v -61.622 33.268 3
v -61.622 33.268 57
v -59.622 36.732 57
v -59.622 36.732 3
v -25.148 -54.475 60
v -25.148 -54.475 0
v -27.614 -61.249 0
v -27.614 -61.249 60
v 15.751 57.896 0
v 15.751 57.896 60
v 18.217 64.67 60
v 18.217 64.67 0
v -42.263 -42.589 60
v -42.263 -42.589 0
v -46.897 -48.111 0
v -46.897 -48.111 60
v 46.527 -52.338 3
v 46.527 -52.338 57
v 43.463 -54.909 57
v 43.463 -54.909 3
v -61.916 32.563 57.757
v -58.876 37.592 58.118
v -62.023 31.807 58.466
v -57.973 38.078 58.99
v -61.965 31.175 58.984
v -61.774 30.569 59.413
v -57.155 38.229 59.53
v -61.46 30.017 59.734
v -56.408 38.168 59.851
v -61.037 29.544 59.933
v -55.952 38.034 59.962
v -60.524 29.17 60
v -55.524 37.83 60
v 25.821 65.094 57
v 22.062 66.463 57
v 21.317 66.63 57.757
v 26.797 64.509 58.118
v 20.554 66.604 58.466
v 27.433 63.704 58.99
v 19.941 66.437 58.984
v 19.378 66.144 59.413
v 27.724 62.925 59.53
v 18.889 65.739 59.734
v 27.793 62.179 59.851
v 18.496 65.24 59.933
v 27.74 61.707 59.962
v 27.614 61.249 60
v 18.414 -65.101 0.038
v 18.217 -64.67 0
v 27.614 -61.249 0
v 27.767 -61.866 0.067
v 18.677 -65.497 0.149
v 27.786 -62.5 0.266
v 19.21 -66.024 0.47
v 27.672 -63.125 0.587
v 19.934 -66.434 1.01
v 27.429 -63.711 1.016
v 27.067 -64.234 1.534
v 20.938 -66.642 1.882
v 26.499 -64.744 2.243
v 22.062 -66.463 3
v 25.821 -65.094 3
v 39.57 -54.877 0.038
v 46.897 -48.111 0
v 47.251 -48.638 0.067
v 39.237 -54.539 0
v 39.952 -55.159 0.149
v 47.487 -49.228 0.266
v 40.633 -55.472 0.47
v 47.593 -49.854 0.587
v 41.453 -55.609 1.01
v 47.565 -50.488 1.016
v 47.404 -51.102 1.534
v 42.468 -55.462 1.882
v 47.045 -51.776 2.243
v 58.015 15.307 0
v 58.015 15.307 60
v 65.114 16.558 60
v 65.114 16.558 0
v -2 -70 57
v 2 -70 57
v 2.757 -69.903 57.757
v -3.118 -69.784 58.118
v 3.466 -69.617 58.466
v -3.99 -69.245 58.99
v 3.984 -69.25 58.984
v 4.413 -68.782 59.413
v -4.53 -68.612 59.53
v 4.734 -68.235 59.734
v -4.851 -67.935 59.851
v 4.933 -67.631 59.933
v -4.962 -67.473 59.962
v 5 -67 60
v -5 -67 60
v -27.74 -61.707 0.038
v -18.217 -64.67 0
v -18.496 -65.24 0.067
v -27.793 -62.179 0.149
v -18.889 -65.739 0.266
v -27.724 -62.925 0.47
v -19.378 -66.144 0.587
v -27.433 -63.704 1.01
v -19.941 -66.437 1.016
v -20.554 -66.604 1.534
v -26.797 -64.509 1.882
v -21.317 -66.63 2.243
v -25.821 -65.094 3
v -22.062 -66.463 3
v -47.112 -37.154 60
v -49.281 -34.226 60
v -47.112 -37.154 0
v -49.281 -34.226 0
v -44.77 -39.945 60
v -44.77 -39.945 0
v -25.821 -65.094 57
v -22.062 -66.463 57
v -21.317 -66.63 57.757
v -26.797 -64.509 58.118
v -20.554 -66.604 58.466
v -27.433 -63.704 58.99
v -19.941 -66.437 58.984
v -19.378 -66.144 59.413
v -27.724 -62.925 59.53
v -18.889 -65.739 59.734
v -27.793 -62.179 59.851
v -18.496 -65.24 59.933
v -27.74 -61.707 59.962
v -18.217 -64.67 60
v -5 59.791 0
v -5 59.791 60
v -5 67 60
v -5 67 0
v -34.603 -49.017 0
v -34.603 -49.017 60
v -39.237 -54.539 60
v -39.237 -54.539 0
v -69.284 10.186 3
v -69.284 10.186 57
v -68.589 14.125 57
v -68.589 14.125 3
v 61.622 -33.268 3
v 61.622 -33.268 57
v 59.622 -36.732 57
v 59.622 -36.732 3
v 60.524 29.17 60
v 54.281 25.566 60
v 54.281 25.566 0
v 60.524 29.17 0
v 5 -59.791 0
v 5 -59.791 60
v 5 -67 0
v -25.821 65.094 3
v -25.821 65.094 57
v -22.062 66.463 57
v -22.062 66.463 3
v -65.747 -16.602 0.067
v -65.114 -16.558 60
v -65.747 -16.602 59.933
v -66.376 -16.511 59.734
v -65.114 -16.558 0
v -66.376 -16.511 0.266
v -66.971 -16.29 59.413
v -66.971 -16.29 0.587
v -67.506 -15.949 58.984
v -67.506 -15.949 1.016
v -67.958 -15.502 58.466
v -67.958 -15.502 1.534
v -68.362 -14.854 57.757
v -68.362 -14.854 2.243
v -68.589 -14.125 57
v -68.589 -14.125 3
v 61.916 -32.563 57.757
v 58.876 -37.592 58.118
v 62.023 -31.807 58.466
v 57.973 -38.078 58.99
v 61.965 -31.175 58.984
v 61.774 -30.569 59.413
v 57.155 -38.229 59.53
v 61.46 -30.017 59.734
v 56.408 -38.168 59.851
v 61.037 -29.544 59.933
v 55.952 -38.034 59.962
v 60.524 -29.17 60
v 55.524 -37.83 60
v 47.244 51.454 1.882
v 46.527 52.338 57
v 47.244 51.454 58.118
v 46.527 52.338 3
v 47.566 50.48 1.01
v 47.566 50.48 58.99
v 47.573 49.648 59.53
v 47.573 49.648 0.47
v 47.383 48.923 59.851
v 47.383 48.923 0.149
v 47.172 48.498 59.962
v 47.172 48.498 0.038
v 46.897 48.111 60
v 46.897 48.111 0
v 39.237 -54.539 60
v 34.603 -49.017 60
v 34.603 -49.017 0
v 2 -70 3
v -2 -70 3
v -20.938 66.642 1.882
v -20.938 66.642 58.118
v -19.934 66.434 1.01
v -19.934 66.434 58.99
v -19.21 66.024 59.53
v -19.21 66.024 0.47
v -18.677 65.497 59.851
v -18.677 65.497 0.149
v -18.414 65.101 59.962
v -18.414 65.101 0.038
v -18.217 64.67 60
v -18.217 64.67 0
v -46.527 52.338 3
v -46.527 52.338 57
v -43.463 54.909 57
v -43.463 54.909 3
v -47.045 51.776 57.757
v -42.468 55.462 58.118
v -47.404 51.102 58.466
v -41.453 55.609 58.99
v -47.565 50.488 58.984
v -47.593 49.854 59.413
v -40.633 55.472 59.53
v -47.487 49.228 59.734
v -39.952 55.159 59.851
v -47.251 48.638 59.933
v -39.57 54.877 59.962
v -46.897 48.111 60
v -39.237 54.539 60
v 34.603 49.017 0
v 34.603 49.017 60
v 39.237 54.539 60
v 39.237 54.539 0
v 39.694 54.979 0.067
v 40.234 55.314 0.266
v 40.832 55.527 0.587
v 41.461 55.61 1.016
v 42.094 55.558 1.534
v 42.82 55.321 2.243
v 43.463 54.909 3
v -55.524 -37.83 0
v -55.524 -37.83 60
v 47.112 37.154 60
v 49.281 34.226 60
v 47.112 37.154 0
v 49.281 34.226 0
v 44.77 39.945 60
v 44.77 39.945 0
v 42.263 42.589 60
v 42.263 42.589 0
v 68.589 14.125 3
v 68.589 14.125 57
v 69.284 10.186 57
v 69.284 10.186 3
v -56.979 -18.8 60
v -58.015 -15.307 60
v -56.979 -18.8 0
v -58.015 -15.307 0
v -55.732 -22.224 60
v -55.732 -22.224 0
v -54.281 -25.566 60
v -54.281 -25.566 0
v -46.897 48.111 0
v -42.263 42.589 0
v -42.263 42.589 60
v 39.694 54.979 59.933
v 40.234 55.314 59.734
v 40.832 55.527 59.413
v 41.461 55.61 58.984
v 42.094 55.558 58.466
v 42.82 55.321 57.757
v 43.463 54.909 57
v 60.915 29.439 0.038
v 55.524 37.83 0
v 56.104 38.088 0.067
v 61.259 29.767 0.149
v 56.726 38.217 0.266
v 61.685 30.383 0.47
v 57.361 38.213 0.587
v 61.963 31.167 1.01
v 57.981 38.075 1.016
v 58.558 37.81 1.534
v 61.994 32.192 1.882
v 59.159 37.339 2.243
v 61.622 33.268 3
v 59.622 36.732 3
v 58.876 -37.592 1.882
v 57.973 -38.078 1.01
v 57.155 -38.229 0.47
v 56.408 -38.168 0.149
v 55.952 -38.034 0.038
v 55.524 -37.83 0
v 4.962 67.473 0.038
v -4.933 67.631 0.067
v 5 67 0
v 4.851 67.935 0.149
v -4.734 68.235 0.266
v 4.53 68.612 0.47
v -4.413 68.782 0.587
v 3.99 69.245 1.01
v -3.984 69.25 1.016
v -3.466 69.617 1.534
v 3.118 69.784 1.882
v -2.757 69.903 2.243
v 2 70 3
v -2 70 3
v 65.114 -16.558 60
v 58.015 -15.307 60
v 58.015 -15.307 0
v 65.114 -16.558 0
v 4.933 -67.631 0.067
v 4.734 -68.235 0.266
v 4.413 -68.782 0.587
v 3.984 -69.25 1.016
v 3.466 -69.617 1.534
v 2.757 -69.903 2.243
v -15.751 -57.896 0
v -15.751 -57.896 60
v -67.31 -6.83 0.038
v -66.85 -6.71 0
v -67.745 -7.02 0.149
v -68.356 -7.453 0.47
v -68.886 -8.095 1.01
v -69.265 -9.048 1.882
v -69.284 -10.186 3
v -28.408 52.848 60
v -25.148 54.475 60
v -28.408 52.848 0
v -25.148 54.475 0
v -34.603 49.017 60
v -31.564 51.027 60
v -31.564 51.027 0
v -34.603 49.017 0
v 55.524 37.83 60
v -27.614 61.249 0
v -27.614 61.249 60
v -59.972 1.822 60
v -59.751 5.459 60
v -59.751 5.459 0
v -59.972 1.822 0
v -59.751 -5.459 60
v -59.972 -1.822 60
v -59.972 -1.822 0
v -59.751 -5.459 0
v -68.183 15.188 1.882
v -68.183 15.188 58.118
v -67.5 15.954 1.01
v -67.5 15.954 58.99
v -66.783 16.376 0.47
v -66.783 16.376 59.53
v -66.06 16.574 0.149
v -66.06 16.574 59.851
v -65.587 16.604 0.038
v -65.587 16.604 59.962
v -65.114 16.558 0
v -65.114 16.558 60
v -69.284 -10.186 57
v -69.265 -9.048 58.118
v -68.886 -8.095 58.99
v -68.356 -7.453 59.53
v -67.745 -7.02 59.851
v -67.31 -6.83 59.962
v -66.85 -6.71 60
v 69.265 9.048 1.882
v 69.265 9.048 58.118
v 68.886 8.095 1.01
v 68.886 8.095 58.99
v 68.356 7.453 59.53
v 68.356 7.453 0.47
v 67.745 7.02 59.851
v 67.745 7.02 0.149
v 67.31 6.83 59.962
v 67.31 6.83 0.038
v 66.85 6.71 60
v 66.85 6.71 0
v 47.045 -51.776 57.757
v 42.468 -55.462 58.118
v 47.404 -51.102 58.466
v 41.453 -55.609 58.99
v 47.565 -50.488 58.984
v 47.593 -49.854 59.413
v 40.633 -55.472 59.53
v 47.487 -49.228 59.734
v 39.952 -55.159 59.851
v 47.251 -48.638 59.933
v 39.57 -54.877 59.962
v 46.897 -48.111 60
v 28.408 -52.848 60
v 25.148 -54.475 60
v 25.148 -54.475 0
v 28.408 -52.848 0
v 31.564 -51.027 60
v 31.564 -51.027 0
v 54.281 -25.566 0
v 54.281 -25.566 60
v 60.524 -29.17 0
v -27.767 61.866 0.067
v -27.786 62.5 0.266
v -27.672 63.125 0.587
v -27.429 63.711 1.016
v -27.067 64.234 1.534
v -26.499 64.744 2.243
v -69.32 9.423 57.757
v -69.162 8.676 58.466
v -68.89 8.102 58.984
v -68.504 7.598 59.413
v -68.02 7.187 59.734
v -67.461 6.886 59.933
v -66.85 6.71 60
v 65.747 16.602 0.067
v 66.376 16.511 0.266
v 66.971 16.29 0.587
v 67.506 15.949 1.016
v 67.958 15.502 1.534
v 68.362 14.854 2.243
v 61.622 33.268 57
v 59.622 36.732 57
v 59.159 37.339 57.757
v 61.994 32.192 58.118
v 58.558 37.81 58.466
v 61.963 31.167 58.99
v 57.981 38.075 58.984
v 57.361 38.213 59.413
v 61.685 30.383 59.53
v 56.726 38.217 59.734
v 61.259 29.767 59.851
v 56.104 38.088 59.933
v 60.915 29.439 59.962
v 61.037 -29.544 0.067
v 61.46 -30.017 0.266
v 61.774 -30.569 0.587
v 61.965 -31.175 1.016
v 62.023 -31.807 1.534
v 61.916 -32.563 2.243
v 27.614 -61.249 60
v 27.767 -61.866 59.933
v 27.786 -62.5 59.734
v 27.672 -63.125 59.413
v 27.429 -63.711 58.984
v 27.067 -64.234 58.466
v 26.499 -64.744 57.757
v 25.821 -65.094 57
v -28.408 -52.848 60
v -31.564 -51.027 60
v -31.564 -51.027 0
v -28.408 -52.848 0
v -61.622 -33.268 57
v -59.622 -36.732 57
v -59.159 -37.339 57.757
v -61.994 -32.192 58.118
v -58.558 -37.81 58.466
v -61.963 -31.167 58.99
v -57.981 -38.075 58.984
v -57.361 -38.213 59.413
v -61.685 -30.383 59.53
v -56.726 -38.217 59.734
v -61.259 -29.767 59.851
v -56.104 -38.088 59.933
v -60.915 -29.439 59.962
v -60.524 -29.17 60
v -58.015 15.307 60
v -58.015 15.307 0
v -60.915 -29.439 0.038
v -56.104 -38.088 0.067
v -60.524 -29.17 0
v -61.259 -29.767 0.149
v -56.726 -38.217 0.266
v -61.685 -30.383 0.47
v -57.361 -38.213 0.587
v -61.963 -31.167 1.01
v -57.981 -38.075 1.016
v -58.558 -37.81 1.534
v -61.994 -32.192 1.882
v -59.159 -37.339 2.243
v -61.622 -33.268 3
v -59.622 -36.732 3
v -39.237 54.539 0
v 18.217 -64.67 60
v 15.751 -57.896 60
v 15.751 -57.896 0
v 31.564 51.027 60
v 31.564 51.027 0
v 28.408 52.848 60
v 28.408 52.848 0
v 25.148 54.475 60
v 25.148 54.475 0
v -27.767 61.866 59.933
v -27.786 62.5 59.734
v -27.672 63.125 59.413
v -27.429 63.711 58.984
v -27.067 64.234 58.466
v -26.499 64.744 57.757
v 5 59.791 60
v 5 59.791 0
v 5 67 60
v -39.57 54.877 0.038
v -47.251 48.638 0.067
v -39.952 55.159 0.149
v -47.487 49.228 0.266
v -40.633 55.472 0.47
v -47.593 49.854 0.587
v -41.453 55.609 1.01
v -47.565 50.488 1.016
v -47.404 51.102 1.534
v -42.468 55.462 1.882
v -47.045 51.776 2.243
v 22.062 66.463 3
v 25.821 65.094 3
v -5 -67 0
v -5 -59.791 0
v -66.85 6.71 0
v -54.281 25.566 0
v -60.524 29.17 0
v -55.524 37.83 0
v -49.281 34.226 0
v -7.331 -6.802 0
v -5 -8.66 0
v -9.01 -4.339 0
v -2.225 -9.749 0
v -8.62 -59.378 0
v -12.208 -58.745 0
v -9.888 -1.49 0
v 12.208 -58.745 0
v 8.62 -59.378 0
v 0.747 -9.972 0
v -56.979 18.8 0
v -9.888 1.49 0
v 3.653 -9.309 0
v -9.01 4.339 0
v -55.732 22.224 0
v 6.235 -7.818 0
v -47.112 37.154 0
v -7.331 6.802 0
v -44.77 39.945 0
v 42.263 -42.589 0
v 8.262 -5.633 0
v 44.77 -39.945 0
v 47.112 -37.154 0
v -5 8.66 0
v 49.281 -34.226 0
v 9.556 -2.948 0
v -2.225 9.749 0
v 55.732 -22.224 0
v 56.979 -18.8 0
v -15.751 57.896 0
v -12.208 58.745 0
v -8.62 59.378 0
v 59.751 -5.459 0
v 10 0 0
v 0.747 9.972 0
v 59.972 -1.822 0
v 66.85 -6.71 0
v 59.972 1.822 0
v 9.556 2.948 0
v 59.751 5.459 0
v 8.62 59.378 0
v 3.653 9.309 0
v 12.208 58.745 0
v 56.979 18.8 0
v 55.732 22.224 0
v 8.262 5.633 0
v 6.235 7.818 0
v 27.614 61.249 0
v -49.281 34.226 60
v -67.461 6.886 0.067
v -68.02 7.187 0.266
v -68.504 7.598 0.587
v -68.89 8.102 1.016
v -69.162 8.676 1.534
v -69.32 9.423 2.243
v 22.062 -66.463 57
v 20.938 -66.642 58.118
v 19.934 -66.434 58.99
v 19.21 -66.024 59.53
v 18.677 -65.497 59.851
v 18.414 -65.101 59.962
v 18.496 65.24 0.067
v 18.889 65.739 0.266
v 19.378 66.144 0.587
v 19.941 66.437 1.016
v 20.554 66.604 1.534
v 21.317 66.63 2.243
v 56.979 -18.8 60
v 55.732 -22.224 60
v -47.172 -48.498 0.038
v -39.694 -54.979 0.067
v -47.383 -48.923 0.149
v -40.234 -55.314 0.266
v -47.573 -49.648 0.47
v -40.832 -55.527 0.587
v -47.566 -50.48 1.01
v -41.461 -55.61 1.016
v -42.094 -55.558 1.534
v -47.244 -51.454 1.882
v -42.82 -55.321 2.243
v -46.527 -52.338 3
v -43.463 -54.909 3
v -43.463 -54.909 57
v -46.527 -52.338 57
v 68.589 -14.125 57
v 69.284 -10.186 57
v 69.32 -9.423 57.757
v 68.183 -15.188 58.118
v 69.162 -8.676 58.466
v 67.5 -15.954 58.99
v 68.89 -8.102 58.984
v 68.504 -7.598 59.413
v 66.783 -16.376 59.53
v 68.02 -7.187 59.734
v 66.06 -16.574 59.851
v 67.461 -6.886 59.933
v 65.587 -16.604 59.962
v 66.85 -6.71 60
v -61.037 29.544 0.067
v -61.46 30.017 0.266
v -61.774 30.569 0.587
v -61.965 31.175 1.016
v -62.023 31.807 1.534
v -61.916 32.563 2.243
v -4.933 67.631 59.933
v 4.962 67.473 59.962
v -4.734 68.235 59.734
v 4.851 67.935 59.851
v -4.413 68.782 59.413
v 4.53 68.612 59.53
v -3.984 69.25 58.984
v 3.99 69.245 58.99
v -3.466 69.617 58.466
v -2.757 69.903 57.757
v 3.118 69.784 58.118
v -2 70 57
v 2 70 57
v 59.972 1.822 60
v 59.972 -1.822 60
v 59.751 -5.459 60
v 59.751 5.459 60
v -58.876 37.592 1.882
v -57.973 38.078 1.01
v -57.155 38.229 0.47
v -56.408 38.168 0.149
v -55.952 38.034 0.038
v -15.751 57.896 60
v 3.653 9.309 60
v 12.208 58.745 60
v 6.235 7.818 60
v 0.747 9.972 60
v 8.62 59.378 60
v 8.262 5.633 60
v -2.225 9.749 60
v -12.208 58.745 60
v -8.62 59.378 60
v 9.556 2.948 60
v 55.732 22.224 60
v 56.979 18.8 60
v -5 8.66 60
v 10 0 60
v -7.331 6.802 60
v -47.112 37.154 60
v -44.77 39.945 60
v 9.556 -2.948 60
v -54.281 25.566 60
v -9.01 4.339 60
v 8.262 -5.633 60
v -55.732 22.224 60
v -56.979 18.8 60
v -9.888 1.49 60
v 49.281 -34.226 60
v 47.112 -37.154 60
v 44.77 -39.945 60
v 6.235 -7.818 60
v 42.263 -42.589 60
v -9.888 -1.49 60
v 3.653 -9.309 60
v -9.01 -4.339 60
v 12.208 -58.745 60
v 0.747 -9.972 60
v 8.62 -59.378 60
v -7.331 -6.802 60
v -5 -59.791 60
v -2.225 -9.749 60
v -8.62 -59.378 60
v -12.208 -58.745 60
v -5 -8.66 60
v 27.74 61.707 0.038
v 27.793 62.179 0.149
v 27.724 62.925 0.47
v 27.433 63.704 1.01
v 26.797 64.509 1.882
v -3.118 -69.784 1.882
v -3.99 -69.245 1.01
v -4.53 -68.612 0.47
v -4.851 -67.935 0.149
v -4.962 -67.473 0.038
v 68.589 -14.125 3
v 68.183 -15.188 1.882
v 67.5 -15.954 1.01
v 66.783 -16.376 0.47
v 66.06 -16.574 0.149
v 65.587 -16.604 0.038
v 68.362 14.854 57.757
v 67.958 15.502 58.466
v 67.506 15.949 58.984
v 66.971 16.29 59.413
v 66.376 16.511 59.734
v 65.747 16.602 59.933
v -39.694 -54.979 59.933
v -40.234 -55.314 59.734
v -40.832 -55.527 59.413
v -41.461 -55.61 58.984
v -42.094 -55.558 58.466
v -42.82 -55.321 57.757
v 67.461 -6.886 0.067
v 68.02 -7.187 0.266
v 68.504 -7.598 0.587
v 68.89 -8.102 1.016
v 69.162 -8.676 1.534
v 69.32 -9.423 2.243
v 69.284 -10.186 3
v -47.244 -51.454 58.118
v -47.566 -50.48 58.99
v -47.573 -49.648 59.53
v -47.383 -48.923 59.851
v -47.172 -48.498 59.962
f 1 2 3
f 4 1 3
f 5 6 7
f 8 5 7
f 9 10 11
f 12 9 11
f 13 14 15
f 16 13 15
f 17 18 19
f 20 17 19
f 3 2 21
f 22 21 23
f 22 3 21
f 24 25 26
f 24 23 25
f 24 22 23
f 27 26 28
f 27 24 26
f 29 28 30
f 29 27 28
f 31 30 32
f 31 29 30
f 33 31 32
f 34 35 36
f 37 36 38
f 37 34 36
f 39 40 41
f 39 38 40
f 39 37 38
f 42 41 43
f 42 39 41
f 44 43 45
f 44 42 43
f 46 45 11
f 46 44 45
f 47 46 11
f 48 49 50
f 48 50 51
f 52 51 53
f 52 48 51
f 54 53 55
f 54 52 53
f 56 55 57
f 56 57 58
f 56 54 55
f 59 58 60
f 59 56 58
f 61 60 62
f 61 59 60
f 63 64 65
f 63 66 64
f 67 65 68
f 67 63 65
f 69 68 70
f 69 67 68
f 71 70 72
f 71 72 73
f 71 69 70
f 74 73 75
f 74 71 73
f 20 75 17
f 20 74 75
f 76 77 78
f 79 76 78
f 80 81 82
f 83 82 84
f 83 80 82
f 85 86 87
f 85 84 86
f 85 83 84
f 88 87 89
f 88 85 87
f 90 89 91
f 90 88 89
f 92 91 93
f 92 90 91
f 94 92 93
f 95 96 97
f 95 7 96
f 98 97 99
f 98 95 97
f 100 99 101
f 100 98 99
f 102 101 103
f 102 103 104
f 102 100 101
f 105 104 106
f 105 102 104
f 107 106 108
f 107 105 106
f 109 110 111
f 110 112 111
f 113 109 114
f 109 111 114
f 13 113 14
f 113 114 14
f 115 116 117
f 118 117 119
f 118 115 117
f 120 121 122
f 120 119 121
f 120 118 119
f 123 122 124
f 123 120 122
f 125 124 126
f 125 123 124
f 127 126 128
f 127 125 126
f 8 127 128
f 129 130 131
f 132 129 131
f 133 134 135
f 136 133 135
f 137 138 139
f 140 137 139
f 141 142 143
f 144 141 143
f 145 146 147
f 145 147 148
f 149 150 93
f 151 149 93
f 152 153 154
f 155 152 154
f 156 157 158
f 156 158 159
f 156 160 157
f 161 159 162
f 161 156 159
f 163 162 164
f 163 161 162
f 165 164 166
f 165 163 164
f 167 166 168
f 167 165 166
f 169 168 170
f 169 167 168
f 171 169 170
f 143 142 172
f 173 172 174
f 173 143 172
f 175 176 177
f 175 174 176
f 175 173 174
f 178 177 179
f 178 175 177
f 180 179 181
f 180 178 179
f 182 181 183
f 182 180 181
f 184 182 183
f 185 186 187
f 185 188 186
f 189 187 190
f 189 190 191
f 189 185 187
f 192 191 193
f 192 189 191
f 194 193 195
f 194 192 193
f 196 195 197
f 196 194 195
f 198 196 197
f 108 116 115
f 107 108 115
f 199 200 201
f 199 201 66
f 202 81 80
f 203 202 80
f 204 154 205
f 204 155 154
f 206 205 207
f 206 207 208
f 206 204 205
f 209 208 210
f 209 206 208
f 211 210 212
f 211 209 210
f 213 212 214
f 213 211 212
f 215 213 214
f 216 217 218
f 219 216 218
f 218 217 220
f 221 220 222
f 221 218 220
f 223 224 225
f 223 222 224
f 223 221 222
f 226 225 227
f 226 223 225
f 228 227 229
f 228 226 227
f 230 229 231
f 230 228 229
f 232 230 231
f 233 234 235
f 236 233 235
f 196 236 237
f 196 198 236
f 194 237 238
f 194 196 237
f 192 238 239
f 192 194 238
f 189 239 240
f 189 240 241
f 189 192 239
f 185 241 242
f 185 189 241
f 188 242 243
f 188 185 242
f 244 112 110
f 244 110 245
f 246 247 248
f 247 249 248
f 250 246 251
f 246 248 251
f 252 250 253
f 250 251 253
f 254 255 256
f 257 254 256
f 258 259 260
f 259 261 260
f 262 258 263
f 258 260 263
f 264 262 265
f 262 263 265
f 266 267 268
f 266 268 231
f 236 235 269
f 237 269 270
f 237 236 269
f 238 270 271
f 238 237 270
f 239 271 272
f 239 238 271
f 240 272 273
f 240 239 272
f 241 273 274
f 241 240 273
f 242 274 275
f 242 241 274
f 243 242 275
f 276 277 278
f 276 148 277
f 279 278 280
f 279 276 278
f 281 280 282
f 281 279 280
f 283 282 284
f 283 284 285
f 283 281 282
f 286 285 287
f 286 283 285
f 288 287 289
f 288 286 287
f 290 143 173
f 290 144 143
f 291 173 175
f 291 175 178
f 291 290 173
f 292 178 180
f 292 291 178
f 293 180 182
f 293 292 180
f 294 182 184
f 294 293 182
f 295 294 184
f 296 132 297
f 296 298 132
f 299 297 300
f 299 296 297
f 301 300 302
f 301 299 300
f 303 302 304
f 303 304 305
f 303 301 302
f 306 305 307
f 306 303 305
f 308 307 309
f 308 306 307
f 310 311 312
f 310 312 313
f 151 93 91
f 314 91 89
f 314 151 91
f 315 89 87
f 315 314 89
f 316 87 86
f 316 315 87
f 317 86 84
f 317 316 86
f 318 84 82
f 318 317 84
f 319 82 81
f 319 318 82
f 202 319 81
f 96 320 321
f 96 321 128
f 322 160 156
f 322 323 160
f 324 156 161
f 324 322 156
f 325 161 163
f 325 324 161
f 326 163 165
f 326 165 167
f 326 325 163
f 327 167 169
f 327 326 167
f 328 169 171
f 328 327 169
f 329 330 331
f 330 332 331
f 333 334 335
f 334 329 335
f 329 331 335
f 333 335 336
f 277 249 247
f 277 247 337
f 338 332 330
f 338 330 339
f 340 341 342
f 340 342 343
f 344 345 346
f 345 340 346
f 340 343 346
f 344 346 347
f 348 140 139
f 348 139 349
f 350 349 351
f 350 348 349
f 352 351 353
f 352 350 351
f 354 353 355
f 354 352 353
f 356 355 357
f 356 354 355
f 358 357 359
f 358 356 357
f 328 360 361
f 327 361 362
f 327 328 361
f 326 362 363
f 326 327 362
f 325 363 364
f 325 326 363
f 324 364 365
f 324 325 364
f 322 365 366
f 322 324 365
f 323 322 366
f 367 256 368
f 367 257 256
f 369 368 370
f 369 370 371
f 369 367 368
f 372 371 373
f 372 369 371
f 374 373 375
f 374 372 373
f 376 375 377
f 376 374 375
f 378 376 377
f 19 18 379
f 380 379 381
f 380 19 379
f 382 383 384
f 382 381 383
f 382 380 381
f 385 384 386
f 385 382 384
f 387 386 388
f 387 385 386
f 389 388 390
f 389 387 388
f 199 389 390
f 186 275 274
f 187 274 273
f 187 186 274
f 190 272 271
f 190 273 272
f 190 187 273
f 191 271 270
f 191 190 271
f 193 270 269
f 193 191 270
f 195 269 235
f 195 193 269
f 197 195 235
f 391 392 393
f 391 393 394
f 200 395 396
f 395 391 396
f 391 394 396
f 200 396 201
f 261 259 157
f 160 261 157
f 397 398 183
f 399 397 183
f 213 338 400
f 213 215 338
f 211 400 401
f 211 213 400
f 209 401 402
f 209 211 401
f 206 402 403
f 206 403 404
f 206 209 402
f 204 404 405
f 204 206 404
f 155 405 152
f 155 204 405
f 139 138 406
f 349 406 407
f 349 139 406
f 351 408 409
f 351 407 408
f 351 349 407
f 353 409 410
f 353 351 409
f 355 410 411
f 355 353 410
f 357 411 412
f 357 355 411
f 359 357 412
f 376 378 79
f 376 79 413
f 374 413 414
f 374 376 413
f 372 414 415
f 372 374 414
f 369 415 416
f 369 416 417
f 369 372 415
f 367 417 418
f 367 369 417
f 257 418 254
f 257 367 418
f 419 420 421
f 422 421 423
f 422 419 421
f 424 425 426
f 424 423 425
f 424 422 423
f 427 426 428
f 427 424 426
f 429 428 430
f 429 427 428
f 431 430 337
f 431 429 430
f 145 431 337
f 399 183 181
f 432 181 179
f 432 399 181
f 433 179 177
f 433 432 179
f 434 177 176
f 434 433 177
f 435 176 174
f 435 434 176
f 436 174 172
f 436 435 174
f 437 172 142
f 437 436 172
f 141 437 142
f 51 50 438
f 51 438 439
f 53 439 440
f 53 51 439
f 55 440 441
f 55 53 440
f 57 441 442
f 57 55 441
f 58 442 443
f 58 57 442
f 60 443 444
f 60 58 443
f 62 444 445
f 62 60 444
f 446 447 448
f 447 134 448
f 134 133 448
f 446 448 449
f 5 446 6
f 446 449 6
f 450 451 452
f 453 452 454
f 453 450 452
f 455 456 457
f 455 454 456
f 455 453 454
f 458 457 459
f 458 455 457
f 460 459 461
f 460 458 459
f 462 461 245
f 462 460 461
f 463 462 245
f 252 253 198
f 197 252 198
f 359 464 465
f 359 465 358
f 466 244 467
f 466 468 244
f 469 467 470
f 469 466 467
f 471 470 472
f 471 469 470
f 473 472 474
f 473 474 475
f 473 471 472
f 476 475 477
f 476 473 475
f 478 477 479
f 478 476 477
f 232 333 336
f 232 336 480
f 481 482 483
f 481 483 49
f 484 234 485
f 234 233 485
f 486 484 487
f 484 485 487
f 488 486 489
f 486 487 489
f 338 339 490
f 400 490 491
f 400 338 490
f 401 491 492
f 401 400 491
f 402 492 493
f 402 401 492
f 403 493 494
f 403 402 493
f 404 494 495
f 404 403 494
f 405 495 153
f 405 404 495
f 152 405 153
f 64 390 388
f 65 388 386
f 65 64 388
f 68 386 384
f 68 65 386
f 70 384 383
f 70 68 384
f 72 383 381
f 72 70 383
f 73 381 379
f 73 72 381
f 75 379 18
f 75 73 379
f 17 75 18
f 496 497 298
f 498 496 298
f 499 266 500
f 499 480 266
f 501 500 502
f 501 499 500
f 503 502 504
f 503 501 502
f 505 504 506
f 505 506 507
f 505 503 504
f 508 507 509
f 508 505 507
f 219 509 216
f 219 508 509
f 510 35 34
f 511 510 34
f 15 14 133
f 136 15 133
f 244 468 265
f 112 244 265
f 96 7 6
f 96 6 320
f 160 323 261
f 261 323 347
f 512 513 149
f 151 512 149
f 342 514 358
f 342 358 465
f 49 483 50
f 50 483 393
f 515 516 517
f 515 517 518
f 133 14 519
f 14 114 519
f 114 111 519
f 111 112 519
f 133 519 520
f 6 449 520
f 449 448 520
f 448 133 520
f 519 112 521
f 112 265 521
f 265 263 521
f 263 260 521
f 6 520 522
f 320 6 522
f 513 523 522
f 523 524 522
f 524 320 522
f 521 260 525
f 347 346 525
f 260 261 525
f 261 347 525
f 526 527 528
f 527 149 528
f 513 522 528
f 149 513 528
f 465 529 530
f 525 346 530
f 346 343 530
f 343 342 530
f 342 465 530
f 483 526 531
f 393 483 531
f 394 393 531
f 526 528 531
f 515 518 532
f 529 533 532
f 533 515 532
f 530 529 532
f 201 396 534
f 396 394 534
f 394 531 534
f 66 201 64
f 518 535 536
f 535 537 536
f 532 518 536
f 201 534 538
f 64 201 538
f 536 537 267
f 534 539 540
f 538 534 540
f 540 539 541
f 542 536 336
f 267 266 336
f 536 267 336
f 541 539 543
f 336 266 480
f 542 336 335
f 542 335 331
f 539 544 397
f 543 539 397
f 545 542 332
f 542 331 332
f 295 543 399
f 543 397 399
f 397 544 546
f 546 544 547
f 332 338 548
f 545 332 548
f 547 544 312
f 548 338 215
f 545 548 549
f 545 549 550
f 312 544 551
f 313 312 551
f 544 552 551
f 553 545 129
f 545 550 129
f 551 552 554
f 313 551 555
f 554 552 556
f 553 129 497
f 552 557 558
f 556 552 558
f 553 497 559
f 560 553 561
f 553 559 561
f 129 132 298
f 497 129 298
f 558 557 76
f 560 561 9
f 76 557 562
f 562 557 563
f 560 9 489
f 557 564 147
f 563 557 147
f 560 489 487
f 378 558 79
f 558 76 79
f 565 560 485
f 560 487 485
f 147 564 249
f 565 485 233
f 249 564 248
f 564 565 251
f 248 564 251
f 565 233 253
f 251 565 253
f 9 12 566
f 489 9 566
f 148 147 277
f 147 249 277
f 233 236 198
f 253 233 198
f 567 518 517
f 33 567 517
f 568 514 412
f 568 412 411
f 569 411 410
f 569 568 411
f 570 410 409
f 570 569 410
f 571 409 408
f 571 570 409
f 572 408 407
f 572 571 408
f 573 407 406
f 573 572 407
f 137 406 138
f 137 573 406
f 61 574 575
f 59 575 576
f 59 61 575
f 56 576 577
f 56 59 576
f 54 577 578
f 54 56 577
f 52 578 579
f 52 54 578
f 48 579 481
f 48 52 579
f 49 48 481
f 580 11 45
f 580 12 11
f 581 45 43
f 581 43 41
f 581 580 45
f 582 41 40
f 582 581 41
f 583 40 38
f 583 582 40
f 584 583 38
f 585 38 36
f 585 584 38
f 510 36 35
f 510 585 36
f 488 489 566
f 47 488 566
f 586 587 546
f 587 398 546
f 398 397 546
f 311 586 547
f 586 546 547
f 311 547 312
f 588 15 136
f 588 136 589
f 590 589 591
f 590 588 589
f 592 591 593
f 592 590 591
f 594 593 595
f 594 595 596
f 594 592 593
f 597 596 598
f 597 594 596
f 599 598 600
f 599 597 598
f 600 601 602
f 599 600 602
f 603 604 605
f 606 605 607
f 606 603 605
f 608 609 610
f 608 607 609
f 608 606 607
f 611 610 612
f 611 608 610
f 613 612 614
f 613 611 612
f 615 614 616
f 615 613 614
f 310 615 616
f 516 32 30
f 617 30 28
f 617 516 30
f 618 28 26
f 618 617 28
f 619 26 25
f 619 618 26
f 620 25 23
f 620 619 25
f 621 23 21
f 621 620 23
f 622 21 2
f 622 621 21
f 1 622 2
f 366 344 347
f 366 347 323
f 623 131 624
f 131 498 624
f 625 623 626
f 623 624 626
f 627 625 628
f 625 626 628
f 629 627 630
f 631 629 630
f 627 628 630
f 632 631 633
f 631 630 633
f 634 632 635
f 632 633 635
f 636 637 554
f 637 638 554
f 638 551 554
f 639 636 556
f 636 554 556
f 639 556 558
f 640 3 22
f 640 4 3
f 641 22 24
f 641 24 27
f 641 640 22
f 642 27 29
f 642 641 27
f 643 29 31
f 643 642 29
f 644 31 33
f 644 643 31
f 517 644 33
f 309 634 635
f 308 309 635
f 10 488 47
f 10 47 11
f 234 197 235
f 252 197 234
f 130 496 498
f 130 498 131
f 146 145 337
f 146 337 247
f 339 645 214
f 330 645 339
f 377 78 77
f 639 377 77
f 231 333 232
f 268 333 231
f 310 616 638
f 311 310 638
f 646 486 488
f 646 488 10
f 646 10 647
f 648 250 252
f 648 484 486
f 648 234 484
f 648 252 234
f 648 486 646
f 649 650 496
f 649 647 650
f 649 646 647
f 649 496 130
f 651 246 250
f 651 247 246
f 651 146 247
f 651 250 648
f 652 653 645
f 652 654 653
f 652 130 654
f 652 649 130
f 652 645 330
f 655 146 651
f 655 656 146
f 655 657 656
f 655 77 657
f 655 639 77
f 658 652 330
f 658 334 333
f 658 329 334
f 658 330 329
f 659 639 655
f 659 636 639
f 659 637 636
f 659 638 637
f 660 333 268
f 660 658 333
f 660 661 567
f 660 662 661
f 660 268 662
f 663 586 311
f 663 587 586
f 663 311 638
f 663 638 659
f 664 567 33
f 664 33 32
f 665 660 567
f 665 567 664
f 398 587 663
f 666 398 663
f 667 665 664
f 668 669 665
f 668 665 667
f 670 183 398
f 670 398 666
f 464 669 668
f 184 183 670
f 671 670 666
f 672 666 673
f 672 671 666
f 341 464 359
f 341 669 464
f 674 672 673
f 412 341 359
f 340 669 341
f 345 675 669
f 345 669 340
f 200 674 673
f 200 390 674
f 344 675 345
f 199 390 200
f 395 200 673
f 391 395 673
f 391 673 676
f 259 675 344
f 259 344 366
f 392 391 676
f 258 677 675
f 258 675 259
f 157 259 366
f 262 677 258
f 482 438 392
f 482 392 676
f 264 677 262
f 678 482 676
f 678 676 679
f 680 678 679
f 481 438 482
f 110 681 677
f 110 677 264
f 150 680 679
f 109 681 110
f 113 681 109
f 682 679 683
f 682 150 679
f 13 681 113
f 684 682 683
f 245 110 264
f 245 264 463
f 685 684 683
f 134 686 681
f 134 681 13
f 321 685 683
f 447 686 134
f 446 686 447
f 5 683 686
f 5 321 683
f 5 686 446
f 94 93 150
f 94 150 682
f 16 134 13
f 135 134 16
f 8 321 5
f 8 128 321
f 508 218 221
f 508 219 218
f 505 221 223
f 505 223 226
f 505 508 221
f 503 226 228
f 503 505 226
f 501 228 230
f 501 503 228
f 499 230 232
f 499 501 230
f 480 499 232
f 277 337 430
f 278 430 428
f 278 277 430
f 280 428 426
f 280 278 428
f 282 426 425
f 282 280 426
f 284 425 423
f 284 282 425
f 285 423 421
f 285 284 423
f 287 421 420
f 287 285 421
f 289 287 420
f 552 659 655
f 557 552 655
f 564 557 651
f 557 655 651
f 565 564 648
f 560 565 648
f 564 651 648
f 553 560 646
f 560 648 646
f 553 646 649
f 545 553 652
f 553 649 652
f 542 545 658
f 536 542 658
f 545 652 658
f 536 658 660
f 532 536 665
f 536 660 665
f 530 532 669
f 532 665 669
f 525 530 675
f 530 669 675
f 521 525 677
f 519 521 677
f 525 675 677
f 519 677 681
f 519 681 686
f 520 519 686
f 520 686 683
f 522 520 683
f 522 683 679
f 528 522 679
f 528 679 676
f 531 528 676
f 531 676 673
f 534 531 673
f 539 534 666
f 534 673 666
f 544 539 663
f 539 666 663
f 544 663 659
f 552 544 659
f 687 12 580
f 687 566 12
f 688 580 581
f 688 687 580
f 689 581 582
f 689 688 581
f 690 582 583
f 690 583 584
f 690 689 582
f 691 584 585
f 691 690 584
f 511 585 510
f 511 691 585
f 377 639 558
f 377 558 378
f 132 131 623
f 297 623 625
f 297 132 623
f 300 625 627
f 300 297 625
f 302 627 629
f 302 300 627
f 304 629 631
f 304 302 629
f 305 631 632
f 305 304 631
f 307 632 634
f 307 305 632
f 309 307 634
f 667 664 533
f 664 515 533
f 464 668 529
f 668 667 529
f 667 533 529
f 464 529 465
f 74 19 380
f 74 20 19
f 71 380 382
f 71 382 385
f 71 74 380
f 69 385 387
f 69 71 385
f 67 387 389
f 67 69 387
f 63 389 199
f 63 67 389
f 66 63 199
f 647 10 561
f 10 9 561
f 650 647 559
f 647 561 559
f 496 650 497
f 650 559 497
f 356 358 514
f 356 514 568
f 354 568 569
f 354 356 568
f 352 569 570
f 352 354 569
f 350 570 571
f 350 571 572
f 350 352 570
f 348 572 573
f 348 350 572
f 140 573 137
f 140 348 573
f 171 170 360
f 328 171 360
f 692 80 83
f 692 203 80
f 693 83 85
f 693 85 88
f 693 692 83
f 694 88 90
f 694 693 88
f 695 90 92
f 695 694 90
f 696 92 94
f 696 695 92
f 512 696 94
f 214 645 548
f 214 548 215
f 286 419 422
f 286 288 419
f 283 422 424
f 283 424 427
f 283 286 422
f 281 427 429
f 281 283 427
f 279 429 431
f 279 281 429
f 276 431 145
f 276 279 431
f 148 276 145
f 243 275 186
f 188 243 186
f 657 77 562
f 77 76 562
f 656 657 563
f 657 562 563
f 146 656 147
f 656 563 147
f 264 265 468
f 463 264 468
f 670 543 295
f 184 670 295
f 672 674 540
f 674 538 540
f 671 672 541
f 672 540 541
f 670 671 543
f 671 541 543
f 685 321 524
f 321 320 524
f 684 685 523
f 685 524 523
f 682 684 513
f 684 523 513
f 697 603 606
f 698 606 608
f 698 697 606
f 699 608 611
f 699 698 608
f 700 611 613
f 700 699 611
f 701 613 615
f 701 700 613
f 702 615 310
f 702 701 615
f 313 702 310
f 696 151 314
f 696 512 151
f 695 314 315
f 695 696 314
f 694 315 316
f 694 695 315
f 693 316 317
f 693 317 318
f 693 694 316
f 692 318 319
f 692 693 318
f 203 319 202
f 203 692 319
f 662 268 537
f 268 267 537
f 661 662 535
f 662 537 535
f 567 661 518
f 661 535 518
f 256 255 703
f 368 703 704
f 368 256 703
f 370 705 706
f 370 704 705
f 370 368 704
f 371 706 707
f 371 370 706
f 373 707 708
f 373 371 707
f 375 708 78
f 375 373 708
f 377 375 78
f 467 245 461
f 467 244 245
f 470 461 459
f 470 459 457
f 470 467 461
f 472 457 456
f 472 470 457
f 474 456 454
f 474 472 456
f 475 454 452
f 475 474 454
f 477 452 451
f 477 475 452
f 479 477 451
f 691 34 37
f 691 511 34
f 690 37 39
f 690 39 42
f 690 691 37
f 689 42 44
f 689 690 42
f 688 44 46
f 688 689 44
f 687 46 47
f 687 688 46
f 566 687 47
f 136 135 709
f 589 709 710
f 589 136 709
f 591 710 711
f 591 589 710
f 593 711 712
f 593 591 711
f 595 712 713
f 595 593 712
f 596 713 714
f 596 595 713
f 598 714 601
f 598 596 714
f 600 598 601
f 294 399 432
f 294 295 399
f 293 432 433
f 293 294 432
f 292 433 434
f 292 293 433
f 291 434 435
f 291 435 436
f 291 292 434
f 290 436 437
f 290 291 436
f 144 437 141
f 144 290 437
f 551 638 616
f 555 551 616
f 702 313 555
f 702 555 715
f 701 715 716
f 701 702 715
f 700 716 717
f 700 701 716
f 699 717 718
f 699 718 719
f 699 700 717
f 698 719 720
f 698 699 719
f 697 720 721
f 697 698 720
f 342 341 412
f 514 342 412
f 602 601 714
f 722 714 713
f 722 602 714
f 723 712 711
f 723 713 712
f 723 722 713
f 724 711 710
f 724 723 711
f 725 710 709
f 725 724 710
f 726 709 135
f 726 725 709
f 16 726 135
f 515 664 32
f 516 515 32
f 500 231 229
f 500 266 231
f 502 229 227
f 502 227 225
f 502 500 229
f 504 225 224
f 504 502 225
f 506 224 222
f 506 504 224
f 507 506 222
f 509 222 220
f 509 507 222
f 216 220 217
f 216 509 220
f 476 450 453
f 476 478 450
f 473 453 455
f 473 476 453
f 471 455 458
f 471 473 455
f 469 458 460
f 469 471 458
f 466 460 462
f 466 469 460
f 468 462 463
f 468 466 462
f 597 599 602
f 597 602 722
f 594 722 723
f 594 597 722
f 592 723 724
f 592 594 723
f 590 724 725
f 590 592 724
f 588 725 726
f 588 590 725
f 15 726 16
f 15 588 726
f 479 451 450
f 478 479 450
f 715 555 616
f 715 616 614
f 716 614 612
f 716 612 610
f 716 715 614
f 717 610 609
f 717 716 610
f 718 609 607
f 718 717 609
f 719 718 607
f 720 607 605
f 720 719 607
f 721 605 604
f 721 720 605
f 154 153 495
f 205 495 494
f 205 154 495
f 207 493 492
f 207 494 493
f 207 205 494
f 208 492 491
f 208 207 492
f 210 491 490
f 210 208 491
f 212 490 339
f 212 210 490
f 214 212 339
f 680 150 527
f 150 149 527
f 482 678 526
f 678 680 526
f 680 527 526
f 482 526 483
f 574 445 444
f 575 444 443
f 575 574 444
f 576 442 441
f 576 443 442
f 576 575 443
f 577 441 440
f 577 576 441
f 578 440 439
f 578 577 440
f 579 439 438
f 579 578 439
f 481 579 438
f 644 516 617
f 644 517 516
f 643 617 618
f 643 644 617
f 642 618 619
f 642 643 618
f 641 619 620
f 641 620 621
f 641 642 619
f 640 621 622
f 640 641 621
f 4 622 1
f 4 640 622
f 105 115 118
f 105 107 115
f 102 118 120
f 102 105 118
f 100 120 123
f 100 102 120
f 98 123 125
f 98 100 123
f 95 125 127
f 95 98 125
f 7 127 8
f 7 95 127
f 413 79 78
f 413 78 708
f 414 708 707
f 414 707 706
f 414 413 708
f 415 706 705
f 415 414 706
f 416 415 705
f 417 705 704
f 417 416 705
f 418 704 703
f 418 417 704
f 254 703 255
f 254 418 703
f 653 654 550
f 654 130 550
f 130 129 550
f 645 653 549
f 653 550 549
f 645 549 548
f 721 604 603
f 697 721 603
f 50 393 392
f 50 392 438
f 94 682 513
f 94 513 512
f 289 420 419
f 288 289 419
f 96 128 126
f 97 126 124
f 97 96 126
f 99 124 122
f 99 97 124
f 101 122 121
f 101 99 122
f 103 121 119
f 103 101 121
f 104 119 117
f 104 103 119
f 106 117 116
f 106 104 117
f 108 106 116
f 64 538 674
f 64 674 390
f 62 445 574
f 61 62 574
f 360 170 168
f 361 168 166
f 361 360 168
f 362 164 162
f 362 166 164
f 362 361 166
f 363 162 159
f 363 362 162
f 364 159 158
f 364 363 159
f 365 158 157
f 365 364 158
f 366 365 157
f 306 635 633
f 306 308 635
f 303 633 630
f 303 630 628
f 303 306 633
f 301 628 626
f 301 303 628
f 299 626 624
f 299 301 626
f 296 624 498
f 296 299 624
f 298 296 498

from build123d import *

# Parameters (mm, degrees)
SKETCH2_R                = 60
BOSS_EXTRUDE1_DEPTH      = 60
SKETCH3_W                = 10
SKETCH3_H                = 10.47851478
BOSS_EXTRUDE2_DEPTH      = 60
FILLET2_R                = 3
CIRPATTERN1_COUNT        = 18
FILLET2_OF_CIRPATTERN1_R = 3
SKETCH4_R                = 10
CUT_EXTRUDE1_DEPTH       = 60


with BuildPart() as part:
    # Sketch2 → Boss-Extrude1 (new body)
    with BuildSketch(Plane.XY):
        Circle(SKETCH2_R)
    extrude(amount=BOSS_EXTRUDE1_DEPTH)

    # Sketch3 → Boss-Extrude2 (add)
    with BuildSketch(Plane.XY.offset(60)):
        with Locations((0, 64.76074261)):
            Rectangle(SKETCH3_W, SKETCH3_H)
    boss_extrude2 = extrude(amount=-BOSS_EXTRUDE2_DEPTH)

    # Fillet2
    fillet2_edges = [part.edges().sort_by_distance(p)[0] for p in [
        (5, 70, 30),
        (0, 70, 0),
        (-5, 70, 30),
        (0, 70, 60),
    ]]
    fillet(fillet2_edges, radius=FILLET2_R)

    # CirPattern1: Boss-Extrude2 ×18 about axis
    cirpattern1_axis = Axis((0, 0, 0), (0, 0, 1))
    for i in range(1, CIRPATTERN1_COUNT):
        add(boss_extrude2.rotate(cirpattern1_axis, i * 360 / CIRPATTERN1_COUNT))

    # Fillet2 of CirPattern1
    fillet2_of_cirpattern1_edges = [part.edges().sort_by_distance(p)[0] for p in [
        (-19.242946929, 67.488584172, 30),
        (-23.941410033, 65.778483455, 0),
        (-28.639873137, 64.068382738, 30),
        (-23.941410033, 65.778483455, 60),
        (-41.164910462, 56.837049067, 30),
        (-44.995132678, 53.623111018, 0),
        (-48.825354894, 50.40917297, 30),
        (-44.995132678, 53.623111018, 60),
        (-58.121778265, 39.330127019, 30),
        (-60.621778265, 35, 0),
        (-63.121778265, 30.669872981, 30),
        (-60.621778265, 35, 60),
        (-68.068301823, 17.079411202, 30),
        (-68.936542711, 12.155372437, 0),
        (-69.804783599, 7.231333672, 30),
        (-68.936542711, 12.155372437, 60),
        (-69.804783599, -7.231333672, 30),
        (-68.936542711, -12.155372437, 0),
        (-68.068301823, -17.079411202, 30),
        (-68.936542711, -12.155372437, 60),
        (-63.121778265, -30.669872981, 30),
        (-60.621778265, -35, 0),
        (-58.121778265, -39.330127019, 30),
        (-60.621778265, -35, 60),
        (-48.825354894, -50.40917297, 30),
        (-44.995132678, -53.623111018, 0),
        (-41.164910462, -56.837049067, 30),
        (-44.995132678, -53.623111018, 60),
        (-28.639873137, -64.068382738, 30),
        (-23.941410033, -65.778483455, 0),
        (-19.242946929, -67.488584172, 30),
        (-23.941410033, -65.778483455, 60),
        (-5, -70, 30),
        (0, -70, 0),
        (5, -70, 30),
        (0, -70, 60),
        (19.242946929, -67.488584172, 30),
        (23.941410033, -65.778483455, 0),
        (28.639873137, -64.068382738, 30),
        (23.941410033, -65.778483455, 60),
        (41.164910462, -56.837049067, 30),
        (44.995132678, -53.623111018, 0),
        (48.825354894, -50.40917297, 30),
        (44.995132678, -53.623111018, 60),
        (58.121778265, -39.330127019, 30),
        (60.621778265, -35, 0),
        (63.121778265, -30.669872981, 30),
        (60.621778265, -35, 60),
        (68.068301823, -17.079411202, 30),
        (68.936542711, -12.155372437, 0),
        (69.804783599, -7.231333672, 30),
        (68.936542711, -12.155372437, 60),
        (69.804783599, 7.231333672, 30),
        (68.936542711, 12.155372437, 0),
        (68.068301823, 17.079411202, 30),
        (68.936542711, 12.155372437, 60),
        (63.121778265, 30.669872981, 30),
        (60.621778265, 35, 0),
        (58.121778265, 39.330127019, 30),
        (60.621778265, 35, 60),
        (48.825354894, 50.40917297, 30),
        (44.995132678, 53.623111018, 0),
        (41.164910462, 56.837049067, 30),
        (44.995132678, 53.623111018, 60),
        (28.639873137, 64.068382738, 30),
        (23.941410033, 65.778483455, 0),
        (19.242946929, 67.488584172, 30),
        (23.941410033, 65.778483455, 60),
    ]]
    fillet(fillet2_of_cirpattern1_edges, radius=FILLET2_OF_CIRPATTERN1_R)

    # Sketch4 → Cut-Extrude1 (cut)
    with BuildSketch(Plane.XY.offset(60)):
        Circle(SKETCH4_R)
    extrude(amount=-CUT_EXTRUDE1_DEPTH, mode=Mode.SUBTRACT)


solid = part.part
